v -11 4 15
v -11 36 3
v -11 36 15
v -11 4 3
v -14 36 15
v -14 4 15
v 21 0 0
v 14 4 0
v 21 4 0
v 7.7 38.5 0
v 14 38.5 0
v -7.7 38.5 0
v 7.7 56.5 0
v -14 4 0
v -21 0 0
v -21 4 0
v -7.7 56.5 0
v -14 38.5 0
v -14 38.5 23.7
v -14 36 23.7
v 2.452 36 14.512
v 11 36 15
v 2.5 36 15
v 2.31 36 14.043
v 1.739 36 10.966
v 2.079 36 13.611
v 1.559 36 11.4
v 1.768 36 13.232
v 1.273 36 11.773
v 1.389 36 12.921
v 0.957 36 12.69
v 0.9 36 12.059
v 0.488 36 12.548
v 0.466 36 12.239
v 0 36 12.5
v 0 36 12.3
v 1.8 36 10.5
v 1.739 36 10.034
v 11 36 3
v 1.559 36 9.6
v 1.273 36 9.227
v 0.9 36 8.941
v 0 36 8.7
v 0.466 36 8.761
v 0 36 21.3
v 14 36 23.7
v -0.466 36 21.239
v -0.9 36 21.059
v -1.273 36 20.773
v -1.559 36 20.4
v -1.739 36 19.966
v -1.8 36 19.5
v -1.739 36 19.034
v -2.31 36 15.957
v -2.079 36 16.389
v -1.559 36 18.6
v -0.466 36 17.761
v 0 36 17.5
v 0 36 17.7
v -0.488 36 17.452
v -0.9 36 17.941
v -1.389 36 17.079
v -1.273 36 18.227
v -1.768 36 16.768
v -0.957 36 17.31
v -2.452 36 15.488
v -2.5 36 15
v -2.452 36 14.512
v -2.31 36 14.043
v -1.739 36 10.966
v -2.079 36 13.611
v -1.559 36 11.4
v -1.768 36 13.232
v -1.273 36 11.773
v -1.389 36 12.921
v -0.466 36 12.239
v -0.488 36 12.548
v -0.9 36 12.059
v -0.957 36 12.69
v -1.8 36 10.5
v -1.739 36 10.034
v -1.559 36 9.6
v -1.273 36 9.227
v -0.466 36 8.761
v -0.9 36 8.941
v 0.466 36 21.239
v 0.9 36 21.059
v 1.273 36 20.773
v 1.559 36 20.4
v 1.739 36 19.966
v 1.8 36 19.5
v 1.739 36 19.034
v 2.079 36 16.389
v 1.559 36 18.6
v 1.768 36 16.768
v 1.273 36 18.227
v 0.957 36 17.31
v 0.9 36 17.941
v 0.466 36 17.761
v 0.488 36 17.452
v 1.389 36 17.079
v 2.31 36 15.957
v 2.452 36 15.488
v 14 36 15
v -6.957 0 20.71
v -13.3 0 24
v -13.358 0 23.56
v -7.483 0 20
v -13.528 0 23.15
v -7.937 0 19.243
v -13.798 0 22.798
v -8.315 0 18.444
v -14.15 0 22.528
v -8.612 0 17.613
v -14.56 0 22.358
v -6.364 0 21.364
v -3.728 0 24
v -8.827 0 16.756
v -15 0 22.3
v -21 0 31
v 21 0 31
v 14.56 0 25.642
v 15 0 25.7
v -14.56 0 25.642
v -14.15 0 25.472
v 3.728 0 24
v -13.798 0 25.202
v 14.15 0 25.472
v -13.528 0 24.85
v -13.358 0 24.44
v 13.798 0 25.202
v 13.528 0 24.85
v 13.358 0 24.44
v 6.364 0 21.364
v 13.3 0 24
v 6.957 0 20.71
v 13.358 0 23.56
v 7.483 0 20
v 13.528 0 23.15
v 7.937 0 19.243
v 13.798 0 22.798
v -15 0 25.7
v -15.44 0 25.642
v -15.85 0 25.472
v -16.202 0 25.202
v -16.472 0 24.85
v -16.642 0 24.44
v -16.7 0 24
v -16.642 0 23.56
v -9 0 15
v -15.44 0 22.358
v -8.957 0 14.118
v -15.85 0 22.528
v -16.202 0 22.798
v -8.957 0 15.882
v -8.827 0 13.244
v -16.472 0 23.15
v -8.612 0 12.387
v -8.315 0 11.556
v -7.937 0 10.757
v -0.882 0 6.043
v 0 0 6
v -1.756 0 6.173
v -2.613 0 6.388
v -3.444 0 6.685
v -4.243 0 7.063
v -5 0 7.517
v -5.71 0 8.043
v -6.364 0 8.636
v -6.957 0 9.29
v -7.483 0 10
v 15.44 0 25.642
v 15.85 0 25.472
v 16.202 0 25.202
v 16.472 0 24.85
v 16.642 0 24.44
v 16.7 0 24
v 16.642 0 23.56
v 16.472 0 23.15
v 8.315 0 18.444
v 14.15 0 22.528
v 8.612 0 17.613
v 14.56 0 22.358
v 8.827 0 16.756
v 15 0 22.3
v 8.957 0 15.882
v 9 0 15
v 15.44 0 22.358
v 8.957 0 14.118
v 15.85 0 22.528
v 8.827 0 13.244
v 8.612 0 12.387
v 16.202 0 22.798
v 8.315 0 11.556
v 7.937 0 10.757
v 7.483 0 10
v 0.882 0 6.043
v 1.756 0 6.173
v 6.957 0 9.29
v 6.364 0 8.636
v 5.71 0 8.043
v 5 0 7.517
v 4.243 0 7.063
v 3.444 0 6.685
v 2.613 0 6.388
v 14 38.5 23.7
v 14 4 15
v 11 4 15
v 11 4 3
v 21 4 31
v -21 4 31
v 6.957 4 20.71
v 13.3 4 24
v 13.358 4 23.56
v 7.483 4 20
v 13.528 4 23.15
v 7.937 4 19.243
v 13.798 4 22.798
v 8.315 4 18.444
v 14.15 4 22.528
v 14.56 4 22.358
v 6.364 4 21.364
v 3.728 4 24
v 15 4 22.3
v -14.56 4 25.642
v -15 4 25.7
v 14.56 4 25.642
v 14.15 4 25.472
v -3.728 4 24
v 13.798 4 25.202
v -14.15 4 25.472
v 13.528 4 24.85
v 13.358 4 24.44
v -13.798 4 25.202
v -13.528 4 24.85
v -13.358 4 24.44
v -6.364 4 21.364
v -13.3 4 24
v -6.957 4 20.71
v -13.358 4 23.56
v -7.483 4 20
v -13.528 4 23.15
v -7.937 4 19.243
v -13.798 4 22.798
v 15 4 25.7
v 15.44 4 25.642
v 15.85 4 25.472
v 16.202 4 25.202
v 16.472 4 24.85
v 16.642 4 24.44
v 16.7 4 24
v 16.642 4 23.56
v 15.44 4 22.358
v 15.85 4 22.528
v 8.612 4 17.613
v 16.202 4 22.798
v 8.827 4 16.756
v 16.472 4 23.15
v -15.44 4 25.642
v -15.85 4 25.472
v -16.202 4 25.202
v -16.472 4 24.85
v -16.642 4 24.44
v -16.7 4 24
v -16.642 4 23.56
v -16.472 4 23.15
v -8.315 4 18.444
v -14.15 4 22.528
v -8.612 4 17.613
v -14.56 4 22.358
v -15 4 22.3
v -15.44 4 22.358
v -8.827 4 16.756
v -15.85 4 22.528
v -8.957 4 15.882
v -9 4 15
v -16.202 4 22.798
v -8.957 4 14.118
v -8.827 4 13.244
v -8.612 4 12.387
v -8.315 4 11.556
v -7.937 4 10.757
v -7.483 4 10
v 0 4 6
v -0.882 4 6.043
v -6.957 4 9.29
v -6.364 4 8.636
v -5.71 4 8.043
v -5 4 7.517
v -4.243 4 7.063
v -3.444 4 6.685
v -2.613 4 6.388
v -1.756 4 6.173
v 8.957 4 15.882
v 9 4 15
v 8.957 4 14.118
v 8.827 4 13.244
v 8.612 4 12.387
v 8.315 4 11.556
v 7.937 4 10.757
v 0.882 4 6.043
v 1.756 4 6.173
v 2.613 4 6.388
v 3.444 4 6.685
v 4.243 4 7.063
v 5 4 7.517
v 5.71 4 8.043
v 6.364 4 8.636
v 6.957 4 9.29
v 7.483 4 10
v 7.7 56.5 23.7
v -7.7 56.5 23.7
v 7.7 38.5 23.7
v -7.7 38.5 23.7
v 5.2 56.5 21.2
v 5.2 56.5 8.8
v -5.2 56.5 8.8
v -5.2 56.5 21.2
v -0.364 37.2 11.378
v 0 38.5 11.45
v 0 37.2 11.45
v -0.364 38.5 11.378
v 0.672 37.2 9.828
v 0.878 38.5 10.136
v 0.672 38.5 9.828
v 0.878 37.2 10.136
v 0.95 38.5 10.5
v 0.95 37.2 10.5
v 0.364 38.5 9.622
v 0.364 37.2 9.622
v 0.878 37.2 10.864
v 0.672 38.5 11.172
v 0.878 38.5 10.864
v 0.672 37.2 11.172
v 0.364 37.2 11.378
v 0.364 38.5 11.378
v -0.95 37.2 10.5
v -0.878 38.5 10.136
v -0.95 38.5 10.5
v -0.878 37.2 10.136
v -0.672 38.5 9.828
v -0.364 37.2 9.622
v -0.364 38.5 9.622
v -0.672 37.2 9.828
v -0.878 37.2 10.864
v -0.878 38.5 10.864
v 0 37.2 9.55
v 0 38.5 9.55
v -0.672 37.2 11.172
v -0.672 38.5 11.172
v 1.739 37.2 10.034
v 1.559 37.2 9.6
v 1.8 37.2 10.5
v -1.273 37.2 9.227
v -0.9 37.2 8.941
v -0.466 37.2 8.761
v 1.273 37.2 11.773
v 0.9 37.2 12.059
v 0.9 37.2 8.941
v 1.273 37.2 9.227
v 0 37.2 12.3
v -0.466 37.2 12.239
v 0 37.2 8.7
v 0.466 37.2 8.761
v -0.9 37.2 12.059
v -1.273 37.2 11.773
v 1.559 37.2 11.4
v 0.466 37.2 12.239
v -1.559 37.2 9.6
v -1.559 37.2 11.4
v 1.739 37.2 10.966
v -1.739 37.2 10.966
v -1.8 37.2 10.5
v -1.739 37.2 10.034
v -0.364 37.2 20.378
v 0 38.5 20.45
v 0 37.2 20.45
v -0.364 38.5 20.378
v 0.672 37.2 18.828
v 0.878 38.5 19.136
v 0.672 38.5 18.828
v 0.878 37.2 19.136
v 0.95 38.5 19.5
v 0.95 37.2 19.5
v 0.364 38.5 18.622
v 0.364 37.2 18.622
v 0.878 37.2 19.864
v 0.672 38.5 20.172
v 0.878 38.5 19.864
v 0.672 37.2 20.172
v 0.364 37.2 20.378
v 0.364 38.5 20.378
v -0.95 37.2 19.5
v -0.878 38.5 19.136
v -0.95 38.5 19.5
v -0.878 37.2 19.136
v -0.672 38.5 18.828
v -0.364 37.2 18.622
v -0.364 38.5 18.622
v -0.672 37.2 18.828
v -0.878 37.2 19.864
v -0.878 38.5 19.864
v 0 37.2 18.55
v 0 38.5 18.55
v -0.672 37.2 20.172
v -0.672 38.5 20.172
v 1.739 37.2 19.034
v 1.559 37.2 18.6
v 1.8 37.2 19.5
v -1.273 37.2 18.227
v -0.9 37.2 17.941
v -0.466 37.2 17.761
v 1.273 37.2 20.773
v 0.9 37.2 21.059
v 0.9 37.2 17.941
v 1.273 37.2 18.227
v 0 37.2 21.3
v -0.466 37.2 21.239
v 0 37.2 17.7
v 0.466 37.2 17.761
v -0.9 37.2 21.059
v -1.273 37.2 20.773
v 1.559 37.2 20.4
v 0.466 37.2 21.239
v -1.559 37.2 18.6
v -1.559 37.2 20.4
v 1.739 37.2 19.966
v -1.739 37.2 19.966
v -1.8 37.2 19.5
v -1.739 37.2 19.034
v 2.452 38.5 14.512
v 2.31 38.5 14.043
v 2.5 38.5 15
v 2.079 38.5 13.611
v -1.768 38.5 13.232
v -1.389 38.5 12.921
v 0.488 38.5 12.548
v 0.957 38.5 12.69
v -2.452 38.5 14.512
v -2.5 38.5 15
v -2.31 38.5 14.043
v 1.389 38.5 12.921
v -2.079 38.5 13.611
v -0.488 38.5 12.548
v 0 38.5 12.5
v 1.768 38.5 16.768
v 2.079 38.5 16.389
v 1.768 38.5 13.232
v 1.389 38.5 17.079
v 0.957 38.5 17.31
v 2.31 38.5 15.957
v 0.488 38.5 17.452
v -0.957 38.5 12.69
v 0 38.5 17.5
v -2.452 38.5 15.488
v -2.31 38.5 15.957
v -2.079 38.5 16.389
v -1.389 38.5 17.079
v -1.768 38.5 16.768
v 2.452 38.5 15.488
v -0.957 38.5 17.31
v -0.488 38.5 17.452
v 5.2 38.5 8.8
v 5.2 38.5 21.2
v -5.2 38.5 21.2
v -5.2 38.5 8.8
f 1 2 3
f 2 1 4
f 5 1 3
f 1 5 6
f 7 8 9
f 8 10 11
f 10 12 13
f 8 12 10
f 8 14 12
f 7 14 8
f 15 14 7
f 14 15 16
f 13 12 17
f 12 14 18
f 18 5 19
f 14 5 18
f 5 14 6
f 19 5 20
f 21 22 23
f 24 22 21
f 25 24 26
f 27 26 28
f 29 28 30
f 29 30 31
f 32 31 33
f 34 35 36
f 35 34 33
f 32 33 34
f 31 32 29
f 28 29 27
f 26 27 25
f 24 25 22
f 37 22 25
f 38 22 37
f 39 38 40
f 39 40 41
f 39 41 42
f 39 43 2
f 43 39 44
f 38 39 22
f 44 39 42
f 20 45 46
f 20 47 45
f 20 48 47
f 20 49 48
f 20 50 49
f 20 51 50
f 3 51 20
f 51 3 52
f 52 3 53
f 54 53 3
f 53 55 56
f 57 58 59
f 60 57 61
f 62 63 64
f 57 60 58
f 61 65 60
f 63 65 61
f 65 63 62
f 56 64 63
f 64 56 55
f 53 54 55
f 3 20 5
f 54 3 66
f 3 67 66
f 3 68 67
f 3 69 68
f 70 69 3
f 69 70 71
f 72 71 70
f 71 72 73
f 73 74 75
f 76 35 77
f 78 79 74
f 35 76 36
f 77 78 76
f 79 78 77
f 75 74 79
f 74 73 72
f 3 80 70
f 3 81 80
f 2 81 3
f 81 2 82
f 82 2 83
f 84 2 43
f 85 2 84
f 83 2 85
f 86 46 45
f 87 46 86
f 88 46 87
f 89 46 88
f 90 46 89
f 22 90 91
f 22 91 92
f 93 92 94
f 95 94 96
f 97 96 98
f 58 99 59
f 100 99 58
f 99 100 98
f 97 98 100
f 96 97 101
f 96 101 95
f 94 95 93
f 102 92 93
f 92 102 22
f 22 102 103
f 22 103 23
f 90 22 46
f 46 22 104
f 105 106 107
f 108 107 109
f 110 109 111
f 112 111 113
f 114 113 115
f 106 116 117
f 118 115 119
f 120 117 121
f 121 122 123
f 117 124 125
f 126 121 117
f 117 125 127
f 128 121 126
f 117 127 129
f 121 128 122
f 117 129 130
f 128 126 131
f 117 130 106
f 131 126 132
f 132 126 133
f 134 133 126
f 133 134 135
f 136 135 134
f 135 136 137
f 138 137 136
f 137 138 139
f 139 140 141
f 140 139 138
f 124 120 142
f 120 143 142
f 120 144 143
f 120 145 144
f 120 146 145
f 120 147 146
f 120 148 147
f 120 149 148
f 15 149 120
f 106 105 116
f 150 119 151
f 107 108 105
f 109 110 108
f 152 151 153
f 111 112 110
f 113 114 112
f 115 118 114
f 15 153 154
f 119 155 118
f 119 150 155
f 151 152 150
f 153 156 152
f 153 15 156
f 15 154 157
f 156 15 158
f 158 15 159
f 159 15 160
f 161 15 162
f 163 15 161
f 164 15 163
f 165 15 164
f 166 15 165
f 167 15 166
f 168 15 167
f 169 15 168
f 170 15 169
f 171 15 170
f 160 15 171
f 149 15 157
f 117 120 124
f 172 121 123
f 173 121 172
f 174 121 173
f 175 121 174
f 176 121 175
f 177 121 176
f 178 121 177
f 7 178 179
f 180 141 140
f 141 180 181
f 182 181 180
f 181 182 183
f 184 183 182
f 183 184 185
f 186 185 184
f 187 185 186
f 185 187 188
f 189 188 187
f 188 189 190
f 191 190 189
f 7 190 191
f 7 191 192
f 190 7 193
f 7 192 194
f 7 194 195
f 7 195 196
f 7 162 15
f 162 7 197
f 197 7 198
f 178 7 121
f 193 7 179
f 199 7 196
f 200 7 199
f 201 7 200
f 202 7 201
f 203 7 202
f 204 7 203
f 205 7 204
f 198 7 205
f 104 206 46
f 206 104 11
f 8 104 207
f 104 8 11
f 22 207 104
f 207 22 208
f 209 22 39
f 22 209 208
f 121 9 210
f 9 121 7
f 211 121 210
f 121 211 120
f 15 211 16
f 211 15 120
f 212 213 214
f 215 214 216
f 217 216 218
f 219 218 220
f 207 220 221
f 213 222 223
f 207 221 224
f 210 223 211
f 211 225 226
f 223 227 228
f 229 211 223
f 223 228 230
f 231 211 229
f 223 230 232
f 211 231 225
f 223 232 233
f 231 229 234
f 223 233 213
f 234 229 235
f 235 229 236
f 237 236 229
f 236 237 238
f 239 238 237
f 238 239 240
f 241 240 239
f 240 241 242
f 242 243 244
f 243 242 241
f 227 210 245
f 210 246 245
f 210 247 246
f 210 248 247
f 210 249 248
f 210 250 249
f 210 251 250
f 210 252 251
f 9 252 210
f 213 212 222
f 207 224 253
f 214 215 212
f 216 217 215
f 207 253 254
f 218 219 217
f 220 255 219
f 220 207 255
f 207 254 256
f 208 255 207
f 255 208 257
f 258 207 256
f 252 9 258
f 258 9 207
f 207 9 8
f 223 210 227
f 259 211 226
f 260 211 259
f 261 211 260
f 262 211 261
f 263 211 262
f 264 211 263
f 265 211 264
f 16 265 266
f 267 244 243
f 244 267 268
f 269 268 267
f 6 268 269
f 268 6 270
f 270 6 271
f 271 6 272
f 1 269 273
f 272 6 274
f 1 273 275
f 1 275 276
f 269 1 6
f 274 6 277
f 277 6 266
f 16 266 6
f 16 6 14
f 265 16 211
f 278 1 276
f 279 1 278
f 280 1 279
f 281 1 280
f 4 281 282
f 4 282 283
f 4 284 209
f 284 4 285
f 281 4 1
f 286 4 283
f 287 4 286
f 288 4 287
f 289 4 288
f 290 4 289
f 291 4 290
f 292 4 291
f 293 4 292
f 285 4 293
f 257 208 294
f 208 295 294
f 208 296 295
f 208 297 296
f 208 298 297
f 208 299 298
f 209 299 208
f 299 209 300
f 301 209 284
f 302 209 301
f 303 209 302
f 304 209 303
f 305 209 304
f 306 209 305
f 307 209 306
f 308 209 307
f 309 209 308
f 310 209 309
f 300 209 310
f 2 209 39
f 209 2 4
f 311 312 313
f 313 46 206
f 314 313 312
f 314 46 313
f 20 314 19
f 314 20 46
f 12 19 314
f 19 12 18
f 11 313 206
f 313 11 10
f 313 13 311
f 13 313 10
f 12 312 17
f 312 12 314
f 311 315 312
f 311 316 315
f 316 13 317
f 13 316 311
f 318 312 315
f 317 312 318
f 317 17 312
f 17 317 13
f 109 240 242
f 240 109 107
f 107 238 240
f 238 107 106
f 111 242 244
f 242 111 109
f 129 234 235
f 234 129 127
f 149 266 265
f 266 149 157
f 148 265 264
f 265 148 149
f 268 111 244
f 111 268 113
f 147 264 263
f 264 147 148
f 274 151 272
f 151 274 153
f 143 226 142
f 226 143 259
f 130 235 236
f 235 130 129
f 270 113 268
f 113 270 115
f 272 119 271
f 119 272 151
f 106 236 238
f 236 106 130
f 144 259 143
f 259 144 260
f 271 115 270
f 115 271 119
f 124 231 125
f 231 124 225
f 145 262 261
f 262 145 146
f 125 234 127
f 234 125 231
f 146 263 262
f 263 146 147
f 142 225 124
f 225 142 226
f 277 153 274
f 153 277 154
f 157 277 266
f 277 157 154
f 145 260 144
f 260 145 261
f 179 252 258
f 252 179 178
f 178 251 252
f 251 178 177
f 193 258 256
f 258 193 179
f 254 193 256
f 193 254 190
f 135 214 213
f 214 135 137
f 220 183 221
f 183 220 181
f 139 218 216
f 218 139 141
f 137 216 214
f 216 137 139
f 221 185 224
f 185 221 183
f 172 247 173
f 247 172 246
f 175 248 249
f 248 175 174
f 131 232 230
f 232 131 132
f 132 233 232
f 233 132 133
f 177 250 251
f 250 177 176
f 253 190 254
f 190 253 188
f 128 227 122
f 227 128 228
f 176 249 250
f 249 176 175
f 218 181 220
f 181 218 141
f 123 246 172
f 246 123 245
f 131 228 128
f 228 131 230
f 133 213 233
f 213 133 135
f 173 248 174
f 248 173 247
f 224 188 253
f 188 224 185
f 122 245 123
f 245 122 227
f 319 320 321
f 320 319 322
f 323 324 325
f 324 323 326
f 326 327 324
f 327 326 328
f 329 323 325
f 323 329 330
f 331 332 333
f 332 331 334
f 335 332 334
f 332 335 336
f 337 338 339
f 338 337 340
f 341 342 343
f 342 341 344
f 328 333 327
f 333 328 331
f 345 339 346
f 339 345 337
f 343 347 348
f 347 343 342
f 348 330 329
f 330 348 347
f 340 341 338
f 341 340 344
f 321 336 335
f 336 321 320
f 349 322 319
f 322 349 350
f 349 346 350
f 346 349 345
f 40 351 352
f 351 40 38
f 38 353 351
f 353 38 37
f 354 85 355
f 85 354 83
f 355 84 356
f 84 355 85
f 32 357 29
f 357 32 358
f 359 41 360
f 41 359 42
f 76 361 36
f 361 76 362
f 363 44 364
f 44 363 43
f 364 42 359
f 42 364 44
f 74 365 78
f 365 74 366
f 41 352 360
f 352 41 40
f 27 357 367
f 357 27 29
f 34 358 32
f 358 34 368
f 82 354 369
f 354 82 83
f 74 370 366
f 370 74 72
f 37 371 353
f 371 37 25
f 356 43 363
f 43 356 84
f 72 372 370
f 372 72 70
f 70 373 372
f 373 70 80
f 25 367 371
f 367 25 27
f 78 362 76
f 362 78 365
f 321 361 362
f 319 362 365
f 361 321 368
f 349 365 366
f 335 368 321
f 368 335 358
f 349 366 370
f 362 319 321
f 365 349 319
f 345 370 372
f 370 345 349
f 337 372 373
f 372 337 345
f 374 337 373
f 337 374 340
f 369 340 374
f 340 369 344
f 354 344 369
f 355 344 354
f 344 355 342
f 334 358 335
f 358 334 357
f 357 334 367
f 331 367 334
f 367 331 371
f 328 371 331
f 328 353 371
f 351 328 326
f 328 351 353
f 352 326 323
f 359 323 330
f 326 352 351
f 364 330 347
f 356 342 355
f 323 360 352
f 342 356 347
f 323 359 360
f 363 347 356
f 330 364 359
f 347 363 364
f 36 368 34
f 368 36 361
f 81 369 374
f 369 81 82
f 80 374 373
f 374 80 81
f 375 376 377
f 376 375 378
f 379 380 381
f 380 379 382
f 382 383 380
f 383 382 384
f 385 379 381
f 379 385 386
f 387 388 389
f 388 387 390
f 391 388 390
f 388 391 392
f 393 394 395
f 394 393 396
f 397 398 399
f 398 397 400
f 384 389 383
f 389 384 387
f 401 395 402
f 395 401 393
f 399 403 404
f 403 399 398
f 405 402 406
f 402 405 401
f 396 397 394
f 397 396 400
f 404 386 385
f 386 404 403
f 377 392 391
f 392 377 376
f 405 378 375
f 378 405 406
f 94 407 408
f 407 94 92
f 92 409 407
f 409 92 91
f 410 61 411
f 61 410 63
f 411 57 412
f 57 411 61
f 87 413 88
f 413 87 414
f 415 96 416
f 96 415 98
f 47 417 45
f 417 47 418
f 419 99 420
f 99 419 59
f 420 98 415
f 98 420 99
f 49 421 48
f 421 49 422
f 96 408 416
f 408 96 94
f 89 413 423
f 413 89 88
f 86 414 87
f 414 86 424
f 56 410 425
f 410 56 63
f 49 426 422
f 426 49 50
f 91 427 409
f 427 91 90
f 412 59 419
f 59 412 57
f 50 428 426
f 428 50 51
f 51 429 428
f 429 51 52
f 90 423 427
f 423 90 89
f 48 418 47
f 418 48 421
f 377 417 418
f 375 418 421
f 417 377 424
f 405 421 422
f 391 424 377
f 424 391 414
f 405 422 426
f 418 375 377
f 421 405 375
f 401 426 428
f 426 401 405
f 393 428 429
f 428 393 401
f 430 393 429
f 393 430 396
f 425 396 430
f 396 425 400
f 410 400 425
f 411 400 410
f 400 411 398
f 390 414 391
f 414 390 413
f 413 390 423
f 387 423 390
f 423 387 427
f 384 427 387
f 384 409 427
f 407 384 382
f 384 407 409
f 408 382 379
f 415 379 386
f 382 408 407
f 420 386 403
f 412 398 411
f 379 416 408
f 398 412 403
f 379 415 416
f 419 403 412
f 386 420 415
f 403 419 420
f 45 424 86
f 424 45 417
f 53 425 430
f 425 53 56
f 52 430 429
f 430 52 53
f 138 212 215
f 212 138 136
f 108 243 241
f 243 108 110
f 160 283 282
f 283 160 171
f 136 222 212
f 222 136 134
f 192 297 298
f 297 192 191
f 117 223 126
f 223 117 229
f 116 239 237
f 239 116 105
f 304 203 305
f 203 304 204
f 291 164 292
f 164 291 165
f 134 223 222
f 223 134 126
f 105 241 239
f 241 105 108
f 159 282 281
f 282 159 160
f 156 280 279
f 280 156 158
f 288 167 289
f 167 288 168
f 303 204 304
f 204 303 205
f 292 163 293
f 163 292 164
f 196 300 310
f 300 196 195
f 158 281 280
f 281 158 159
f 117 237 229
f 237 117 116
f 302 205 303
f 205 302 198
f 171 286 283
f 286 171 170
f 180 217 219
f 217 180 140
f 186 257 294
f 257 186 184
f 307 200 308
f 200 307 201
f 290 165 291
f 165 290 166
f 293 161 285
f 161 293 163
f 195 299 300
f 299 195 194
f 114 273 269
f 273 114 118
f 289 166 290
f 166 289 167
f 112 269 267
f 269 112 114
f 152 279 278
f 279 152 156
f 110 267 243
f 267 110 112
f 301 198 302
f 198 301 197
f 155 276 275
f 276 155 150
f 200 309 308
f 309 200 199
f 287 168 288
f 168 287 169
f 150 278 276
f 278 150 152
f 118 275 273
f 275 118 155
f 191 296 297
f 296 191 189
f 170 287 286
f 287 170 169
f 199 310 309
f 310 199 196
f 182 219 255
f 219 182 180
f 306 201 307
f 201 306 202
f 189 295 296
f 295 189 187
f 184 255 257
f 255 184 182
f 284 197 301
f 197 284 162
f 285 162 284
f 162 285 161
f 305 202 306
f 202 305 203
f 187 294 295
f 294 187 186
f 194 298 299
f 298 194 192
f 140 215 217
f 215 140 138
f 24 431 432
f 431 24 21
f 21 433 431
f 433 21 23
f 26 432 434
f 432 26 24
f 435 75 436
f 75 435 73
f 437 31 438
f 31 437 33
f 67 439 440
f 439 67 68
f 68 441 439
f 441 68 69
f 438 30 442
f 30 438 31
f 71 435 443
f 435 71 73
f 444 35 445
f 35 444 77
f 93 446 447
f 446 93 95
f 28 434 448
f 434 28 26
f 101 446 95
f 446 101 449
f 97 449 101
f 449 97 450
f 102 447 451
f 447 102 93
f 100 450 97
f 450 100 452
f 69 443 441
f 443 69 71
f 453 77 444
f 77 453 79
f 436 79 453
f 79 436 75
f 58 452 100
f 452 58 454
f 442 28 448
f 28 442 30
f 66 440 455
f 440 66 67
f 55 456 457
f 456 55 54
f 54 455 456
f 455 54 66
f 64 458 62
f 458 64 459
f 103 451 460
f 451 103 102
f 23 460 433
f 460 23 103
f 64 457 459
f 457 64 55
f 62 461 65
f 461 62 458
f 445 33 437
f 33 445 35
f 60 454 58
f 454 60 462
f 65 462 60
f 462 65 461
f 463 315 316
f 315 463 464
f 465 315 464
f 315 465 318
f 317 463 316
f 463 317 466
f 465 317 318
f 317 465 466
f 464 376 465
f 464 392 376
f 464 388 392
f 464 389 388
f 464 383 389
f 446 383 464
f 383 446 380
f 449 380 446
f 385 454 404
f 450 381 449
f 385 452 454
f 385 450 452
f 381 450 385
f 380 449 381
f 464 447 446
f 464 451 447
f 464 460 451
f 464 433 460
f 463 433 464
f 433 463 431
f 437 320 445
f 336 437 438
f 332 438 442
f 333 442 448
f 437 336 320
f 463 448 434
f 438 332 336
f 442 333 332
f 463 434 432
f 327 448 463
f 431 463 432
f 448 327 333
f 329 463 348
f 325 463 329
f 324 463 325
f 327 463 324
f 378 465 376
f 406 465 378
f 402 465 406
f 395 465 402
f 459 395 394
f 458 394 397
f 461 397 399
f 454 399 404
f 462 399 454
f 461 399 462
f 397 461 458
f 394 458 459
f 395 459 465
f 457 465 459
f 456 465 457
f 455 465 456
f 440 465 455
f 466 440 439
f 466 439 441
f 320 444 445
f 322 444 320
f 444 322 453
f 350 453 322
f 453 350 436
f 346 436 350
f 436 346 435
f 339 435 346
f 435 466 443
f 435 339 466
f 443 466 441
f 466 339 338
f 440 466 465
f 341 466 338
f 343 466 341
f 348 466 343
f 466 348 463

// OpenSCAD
// file: conveyor_roller.scad
// =============================================
// Riftbound Card Sorter — Conveyor Roller / Round-Belt Pulley
// =============================================
// Print 2× (one per 8mm rod: near x=-140 + far x=+60, both driven).
// Drive: N20 → 3mm-to-8mm set-screw coupling (motor_mount.scad) → 8mm rod
//        → this roller (D-bore keyed to the rod flat + M3 grub screw).
// The rollers are the pulleys of a 4-strand ROUND-BELT conveyor: four
// 135 × 3mm NBR O-rings run in the grooves and carry the card across the
// 200mm span between the rollers (slide_bed.scad sits under the top span).
// Material: PLA/PETG, 4 perimeters, 60% infill
//
// Local frame: roller axis = +Z, z = 0 at the front (-Y, motor-side) end.
// In assembly.scad: translate([x, -roller_w/2, 19]) rotate([-90,0,0]),
// so machine Y = z - 44.
// =============================================
//
// ── ROUND BELT (O-ring) MATH ────────────────────────────────────────────
//   Belt: NBR 70A O-ring, ID 135 × CS 3.0 (OD 141), 4 per machine.
//   Free centreline length  = π·(ID + CS) = π·138       = 433.5 mm
//   Stretched CS ≈ 3/√1.074 = 2.89 → cord centre rests at r = 10.45
//   Pitch dia Dp            = 2·10.45                    = 20.9 mm
//   Belt path (open, equal pulleys, C = 200) = 2C + π·Dp = 465.6 mm
//   Stretch                 = 465.6 / 433.5 − 1          = 7.4 %
//   Static tension ≈ E·ε·A ≈ 6 MPa·0.074·6.6 mm² ≈ 2.9 N per strand
//   Sag at mid-span: self weight (8.5 g/m) 0.14 mm + 1.8 g card 0.08 mm
//   → < 0.25 mm, irrelevant optically; slide bed added for robustness.
//   Belt top (card face) r = 10.45 + 1.45 = 11.9 → 0.9 mm above the
//   roller body, so the card only ever touches the belts.
// ────────────────────────────────────────────────────────────────────────

roller_dia  = 22;
roller_w    = 88;    // 90mm rail gap − 2 × 1.0mm running clearance
shaft_bore  = 8.2;   // clearance for 8mm steel rod (ream with 8mm bit)

// Round-belt grooves: R1.6 round bottom + 45° flanks to the OD (teardrop on
// both sides). The old U-groove (R1.6 + flanks parallel to the OD) put a flat
// ceiling over the cord when printed axis-vertical: the region flatter than
// 45° spanned r 9.47 → 11.0 = 1.53 mm, the last layer stepping out ≈ 1.2 mm in
// one go, right where the cord has only 0.15 mm side clearance — droop would
// pinch the belt. With 45° flanks nothing overhangs past 45°. The tensioned
// cord (r 1.45) seats in the R1.6 bottom, which centres it; at its equator
// (r 10.45) the groove is ±2.11, i.e. ≤ 0.66 mm free side play, and the
// mouth at the OD is 5.3 wide (lands 11.7 between strands).
belt_cs      = 3.0;                 // O-ring cross-section (free)
belt_y       = [-25.5, -8.5, 8.5, 25.5];   // strand centres, machine Y (17mm pitch)
groove_r     = 1.6;                 // bottom radius (free cord r 1.5 + 0.1)
groove_c     = 10.6;                // groove-circle centre radius → bottom at r 9.0
belt_pitch_r = 10.45;               // stretched cord centre radius (see math)
belt_top_r   = 11.9;                // card face radius

rod_dia      = 8;
motor_flat_w = 4;    // width of the flat ground along the 8mm rod
flat_clr     = 0.15; // radial clearance roller flat → rod flat
// distance from axis to the roller's flat face (3.61mm for a 4mm-wide flat)
flat_off     = sqrt(pow(rod_dia / 2, 2) - pow(motor_flat_w / 2, 2)) + flat_clr;

// Axial location: M3 heat-set insert (radial, mid-roller, on the flat side)
// + M3 × 6 cup-point grub screw onto the rod flat. Keeps the roller centred
// with 1.0mm to each rail inner face. (Rod itself is located by the two
// collars outside the bearings — see motor_mount.scad.)
grub_z       = roller_w / 2;   // between the two inner belts (±8.5)
grub_insert_d = 4.0;
grub_insert_l = 6.0;           // from the surface inward (insert 5.7 long)
grub_d       = 3.2;            // through to the flat

// 608 inner-race spacer: sits between each bearing's inner ring and the
// rod collar so the collar can never touch the (stationary) ZZ shield.
spacer_id    = 8.3;
spacer_od    = 11.0;           // < 608 inner-ring land Ø12.1
spacer_t     = 1.0;

function roller_width()        = roller_w;
function roller_belt_y()       = belt_y;
function roller_belt_pitch_r() = belt_pitch_r;
function roller_belt_top_r()   = belt_top_r;
function roller_belt_cs()      = 2 * (belt_top_r - belt_pitch_r);  // stretched CS 2.9
function race_spacer_t()       = spacer_t;

// D-shaped bore: round bore minus the key (material left on the flat side)
module d_bore(h)
    difference() {
        cylinder(d = shaft_bore, h = h, $fn = 48);
        translate([-shaft_bore, flat_off, -1])
            cube([2 * shaft_bore, shaft_bore, h + 2]);
    }

// Groove profile in the (r, z) half-plane: R1.6 circle + 45° tangent flanks
module groove_2d() {
    t  = groove_r / sqrt(2);                 // 45° tangent point offset (1.13)
    r0 = groove_c - t;                       // 9.47
    r1 = roller_dia / 2 + 1;                 // past the OD
    translate([groove_c, 0]) circle(r = groove_r, $fn = 32);
    polygon([[r0, -t], [r1, -t - (r1 - r0)], [r1, t + (r1 - r0)], [r0, t]]);
}

module roller() {
    difference() {
        cylinder(d = roller_dia, h = roller_w, $fn = 96);

        // D-bore keyed to the rod flat (flat face at +y = flat_off)
        translate([0, 0, -0.1]) d_bore(roller_w + 0.2);

        // Round-belt grooves (U profile: R1.6 circle + straight walls)
        for (y = belt_y)
            translate([0, 0, y + roller_w / 2])
                rotate_extrude($fn = 96) groove_2d();

        // Grub-screw insert hole (radial, through the flat side) + screw hole
        translate([0, roller_dia / 2 + 0.1, grub_z]) rotate([90, 0, 0]) {
            cylinder(d = grub_insert_d, h = grub_insert_l + 0.1, $fn = 24);
            cylinder(d = grub_d, h = roller_dia / 2, $fn = 24);
        }
    }
}

module race_spacer()
    difference() {
        cylinder(d = spacer_od, h = spacer_t, $fn = 48);
        translate([0, 0, -0.1]) cylinder(d = spacer_id, h = spacer_t + 0.2, $fn = 32);
    }

// Reference solid: one stretched O-ring strand (round cord) running over
// two pulleys c apart, in the XZ plane (x along travel, z up, y = 0 on the
// strand), pulley axes along Y at x = 0 and x = c.
module belt_strand(c = 200) {
    cr = roller_belt_cs() / 2;
    // full torus in each groove (the inner half coincides with the groove,
    // so it adds no false contact; bed ends are 13mm from the axes)
    for (x = [0, c])
        translate([x, 0, 0]) rotate([90, 0, 0])
            rotate_extrude($fn = 64)
                translate([belt_pitch_r, 0]) circle(r = cr, $fn = 24);
    for (z = [-belt_pitch_r, belt_pitch_r])
        translate([0, 0, z]) rotate([0, 90, 0])
            cylinder(r = cr, h = c, $fn = 24);
}

roller();
// translate([20, 0, 0]) race_spacer();   // print 4

// =============================================
// PRINT ORIENTATION: axis vertical (on end); spacer flat
// SUPPORTS: none (groove flanks are 45°, see the groove note; Ø4 radial hole bridges)
// POST-PROCESS: ream bore with an 8mm drill bit (keep the flat),
//   heat-set one M3 insert into the radial hole, flush with the surface.
// ROD: full-length flat, ~0.5mm deep / 4mm wide (or buy 8mm D-shaft) —
//   keys this roller and seats the coupling set screw.
// ASSEMBLY: slide roller on, centre it (1.0mm gap to each rail face),
//   tighten the M3 × 6 grub onto the flat. Fit 4 O-rings across both
//   rollers before the second rod goes in (or roll them on over the end).
// =============================================
// main file
// =============================================
// Riftbound Card Sorter — N20 Motor Standoff Bracket
// =============================================
// Holds one N20 gear motor coaxial with an 8mm roller rod, on the OUTER
// side of the front (-Y) conveyor rail, joined by a 3mm→8mm shaft coupling.
// Print 2× — one per driven roller (both rollers are driven: L9110S ch A
// and ch B, hardware/conveyor.py).
//
// Drive train, outward from the rail (axis = Y below, 0 = boss face):
//   rail inner face │ 3mm wall/shoulder │ 608ZZ in Ø22.15×7 pocket │ y=0 boss face
//   │ FLANGE 0..4 (Ø18 hole) — race spacer 0..1, 8mm collar 1..9 inside it
//   │ gap │ COUPLING 10..35 (Ø19×25) │ gap │ FACE PLATE │ N20 → motor body
//
//   - The flange seats on the boss face + both insert pads and covers the
//     608 OUTER ring (Ø18..22 annulus; bearing is flush with the boss face),
//     so it retains the bearing outward. Its Ø18 hole clears the inner ring
//     (land Ø12.1, 2.95mm radial), the rod, the Ø11 race spacer and the
//     Ø16 shaft collar (1.0mm radial) — it never touches anything rotating.
//   - Race spacer (conveyor_roller.scad, 8.3/11 × 1) + 8mm collar ride on
//     the rod against the inner ring: with the matching collar on the back
//     rail they locate the rod axially. Tighten the collar BEFORE fitting
//     the bracket (its set screw is behind the flange afterwards).
//   - 8mm rod sticks out rod_protrusion (20) past the boss face and enters
//     the coupling's 8mm bore by cpl_rod_engage (10mm).
//   - N20 3mm D-shaft (10mm long) passes the face plate and enters the
//     coupling's 3mm bore by n20_engage (6.5mm, covers the set screw).
//   - The coupling bay is an open-top U-channel (side walls only up to the
//     shaft centreline) so both coupling set screws can be reached from above.
//
// Coupling: aluminium 3mm×8mm bore, D19 × L25, 2× M3 set screws
//   (e.g. https://kitsguru.com/products/19mm-outer-diameter-x-25mm-length-3mm-x-8mm-inner-diameter-rb-aluminium-flexible-shaft-coupling
//    — same D19L25 3×8 helical coupling is sold widely on Amazon/AliExpress).
// Collar: 8mm bore × Ø16 × 8 wide, M4 set screw (e.g. Climax GMC-08, RS PRO
//   122-3450, Stafford 34LM008). A Ø18 collar fits too (0mm margin — avoid).
//
// Frame (assembled): X = along rail (shaft at X=0), Y = 0 on the bearing
// boss face, +Y away from the rail, Z = 0 on the rail base / baseplate.
// Place onto a rail_half(): translate([shaft_x, rail_boss_face_y(), 0]).
//
// Material: PETG or PLA, 0.2mm, 4 walls, 40% infill
// =============================================

use <conveyor_rail.scad>
use <conveyor_roller.scad>

// --- From the rail / roller (single source of truth) ---
shaft_y      = rail_shaft_y();            // 15 — rod axis height
boss_d       = rail_boss_d();             // 29
pocket_d     = rail_pocket_d();           // 22.15
screw_offs   = rail_mm_screw_offsets();   // [[±15, +9]] rel. to shaft (17.5mm)
spacer_t     = race_spacer_t();           // 1.0

// --- 608ZZ ---
brg_inner_land_d = 12.1;   // inner-ring OD land (rotating)
brg_od           = 22.0;

// --- N20 micro gear motor ---
motor_w      = 10.0;   // body width  (X)
motor_h      = 12.0;   // body height (Z)
motor_l      = 20.0;   // gearbox + can length (Y)
n20_shaft_l  = 10.0;   // 3mm D-shaft length from gearbox face
n20_bush_d   =  5.0;   // clearance for the gearbox-face bushing
n20_hole_spc =  9.0;   // 2× M1.6 tapped holes in gearbox face, along the 12mm side (Z)
n20_hole_d   =  1.9;   // M1.6 clearance
n20_head_d   =  3.6;   // M1.6 pan head counterbore
n20_head_h   =  1.2;   // counterbore depth (keeps heads clear of the coupling)
motor_clr    =  0.2;   // pocket clearance per side (snug slide fit)

// --- Rod collar (8mm bore) ---
collar_od     = 16.0;
collar_w      =  8.0;

// --- Shaft coupling (3mm ↔ 8mm) ---
cpl_od        = 19.0;
cpl_len       = 25.0;
cpl_clr       =  1.5;  // radial clearance to bay walls / floor
cpl_rod_engage = 10.0; // 8mm rod depth into coupling (≤ half length)

// --- Bracket ---
flange_t     =  4.0;   // back flange, seats on boss face + insert pads
flange_hw    = 21.0;   // flange half-width (X)
flange_top   = 31.0;   // flange top Z: covers the Ø29 boss (top 29.5); rail top 35
flange_hole_d = 18.0;  // centre hole: collar Ø16 + 1mm, < 608 OD so the
                       //   flange still bears on the outer ring
gap_collar_cpl = 1.0;  // collar → coupling end
gap_cpl_face   = 1.0;  // coupling end → face plate
face_t       =  2.5;   // face plate the gearbox screws to
wall_t       =  3.0;   // bay side walls
floor_t      =  3.0;
sleeve_wall  =  2.5;
sleeve_len   = 18.0;   // covers 18 of the 20mm body; rear + tabs exposed
m3_clear_d   =  3.4;

// ---- Derived ---------------------------------------------------
collar_y0  = spacer_t;                            //  1.0
collar_y1  = collar_y0 + collar_w;                //  9.0
cpl_y0     = collar_y1 + gap_collar_cpl;          // 10.0 coupling start
cpl_y1     = cpl_y0 + cpl_len;                    // 35.0 coupling end
face_y0    = cpl_y1 + gap_cpl_face;               // 36.0
motor_y0   = face_y0 + face_t;                    // 38.5 gearbox face
sleeve_y1  = motor_y0 + sleeve_len;               // 56.5
motor_y1   = motor_y0 + motor_l;                  // 58.5 motor rear

bay_hw     = cpl_od / 2 + cpl_clr;                // 11.0 bay inner half-width
pocket_w   = motor_w + 2 * motor_clr;             // 10.4
pocket_h   = motor_h + 2 * motor_clr;             // 12.4
sleeve_hw  = pocket_w / 2 + sleeve_wall;          //  7.7
sleeve_top = shaft_y + pocket_h / 2 + sleeve_wall; // 23.7

rod_protrusion = cpl_y0 + cpl_rod_engage;         // 20.0 past boss face
n20_engage     = n20_shaft_l - face_t - gap_cpl_face; // 6.5 into coupling

function mm_rod_protrusion() = rod_protrusion;
function mm_collar_od()      = collar_od;
function mm_collar_w()       = collar_w;

echo(str("MOTOR MOUNT: rod protrusion past boss face = ", rod_protrusion,
         " mm; N20 shaft engagement = ", n20_engage,
         " mm; rod-end to N20-shaft-tip gap = ",
         (motor_y0 - n20_shaft_l) - rod_protrusion, " mm; overall depth = ",
         motor_y1, " mm; flange hole Ø", flange_hole_d,
         " (inner-ring radial clr ", (flange_hole_d - brg_inner_land_d) / 2,
         ", collar radial clr ", (flange_hole_d - collar_od) / 2, ")"));

assert(cpl_rod_engage <= cpl_len / 2, "rod would run past coupling centre");
assert(rod_protrusion < motor_y0 - n20_shaft_l, "rod end hits N20 shaft tip");
assert(n20_engage >= 5, "N20 shaft barely reaches the coupling set screw");
assert(shaft_y - cpl_od / 2 - cpl_clr >= floor_t, "coupling rubs the floor");
assert(flange_hole_d > collar_od + 1, "collar rubs the flange");
assert(flange_hole_d > brg_inner_land_d + 2, "flange too close to the 608 inner ring");
assert(flange_hole_d < brg_od - 2, "flange no longer covers the 608 outer ring");
assert(collar_od / 2 < bay_hw, "collar rubs the bay walls");
assert(flange_top >= shaft_y + boss_d / 2, "flange does not cover the boss");
for (o = screw_offs)
    assert(norm(o) >= 15, "mount screw inside 15mm of shaft centre");

// Flat-topped teardrop: prints the Ø18 horizontal hole without supports
module teardrop_y(d, h)
    rotate([-90, 0, 0]) linear_extrude(h)
        intersection() {
            union() {
                circle(d = d, $fn = 64);
                rotate(-135) square(d / 2);   // point → 2D -y → machine +Z
            }
            translate([-d, -d / 2]) square([2 * d, d]);   // flat cap at Z = +r
        }

module motor_mount() {
    difference() {
        union() {
            // Back flange — seats on boss face + both insert pads
            translate([-flange_hw, 0, 0])
                cube([2 * flange_hw, flange_t, flange_top]);

            // Coupling bay: floor + two side walls up to the shaft centreline
            // (open top = set-screw access window)
            translate([-bay_hw - wall_t, 0, 0])
                cube([2 * (bay_hw + wall_t), face_y0, floor_t]);
            for (s = [-1, 1])
                translate([s > 0 ? bay_hw : -bay_hw - wall_t, 0, 0])
                    cube([wall_t, face_y0, shaft_y]);

            // Face plate — N20 gearbox face screws to its back side
            translate([-bay_hw - wall_t, face_y0, 0])
                cube([2 * (bay_hw + wall_t), face_t, sleeve_top]);

            // Motor sleeve (solid down to the floor for a flat print base)
            translate([-sleeve_hw, motor_y0 - 0.01, 0])
                cube([2 * sleeve_hw, sleeve_len + 0.01, sleeve_top]);
        }

        // Flange centre hole (rod, 608 inner ring, spacer, collar, driver access)
        translate([0, -0.1, shaft_y]) teardrop_y(flange_hole_d, flange_t + 0.2);

        // M3 clearance holes → heat-set inserts in the rail pads
        for (o = screw_offs)
            translate([o[0], -0.1, shaft_y + o[1]])
                rotate([-90, 0, 0])
                cylinder(d = m3_clear_d, h = flange_t + 0.2, $fn = 24);

        // Face plate: gearbox bushing + 2× M1.6 screws with counterbores
        translate([0, face_y0 - 0.1, shaft_y])
            rotate([-90, 0, 0])
            cylinder(d = n20_bush_d, h = face_t + 0.2, $fn = 32);
        for (dz = [-n20_hole_spc / 2, n20_hole_spc / 2]) {
            translate([0, face_y0 - 0.1, shaft_y + dz])
                rotate([-90, 0, 0])
                cylinder(d = n20_hole_d, h = face_t + 0.2, $fn = 16);
            translate([0, face_y0 - 0.1, shaft_y + dz])
                rotate([-90, 0, 0])
                cylinder(d = n20_head_d, h = n20_head_h + 0.1, $fn = 24);
        }

        // Motor pocket — open at the rear for the motor tabs / wires
        translate([-pocket_w / 2, motor_y0, shaft_y - pocket_h / 2])
            cube([pocket_w, sleeve_len + 0.1, pocket_h]);
    }
}

// Reference solids (for assembly / collision checks, not printed)
module motor_mount_coupling()
    translate([0, cpl_y0, shaft_y]) rotate([-90, 0, 0])
        cylinder(d = cpl_od, h = cpl_len, $fn = 48);
module motor_mount_collar()     // collar + race spacer, outside the bearing
    translate([0, 0, shaft_y]) rotate([-90, 0, 0]) {
        race_spacer();
        translate([0, 0, collar_y0]) difference() {
            cylinder(d = collar_od, h = collar_w, $fn = 48);
            translate([0, 0, -0.1]) cylinder(d = 8, h = collar_w + 0.2, $fn = 32);
        }
    }
module motor_mount_n20()
    union() {
        translate([-motor_w / 2, motor_y0, shaft_y - motor_h / 2])
            cube([motor_w, motor_l, motor_h]);
        translate([0, motor_y0 - n20_shaft_l, shaft_y]) rotate([-90, 0, 0])
            cylinder(d = 3, h = n20_shaft_l, $fn = 16);
    }
module motor_mount_rod_stub()   // rod portion past the boss face
    translate([0, -0.01, shaft_y]) rotate([-90, 0, 0])
        cylinder(d = 8, h = rod_protrusion + 0.01, $fn = 32);

motor_mount();

// =============================================
// PRINT ORIENTATION: floor (Z=0) on the bed, as modelled
// SUPPORTS: none (flange hole is a flat-topped teardrop, 7.5mm bridge;
//           motor pocket roof is a short bridge)
// FASTENERS: 2× M3×10 BHCS → M3 heat-set inserts in the rail pads
//            2× M1.6×4 pan head → N20 gearbox-face tapped holes
// ASSEMBLY ORDER:
//   1. Slide N20 into the sleeve from the rear, screw its face to the
//      face plate (driver through the flange hole).
//   2. Push the coupling's 3mm bore onto the N20 shaft (set screw on the
//      D-flat), leave it loose.
//   3. Rod (150mm) through both bearings + roller, 20mm past the front boss
//      face. On each side slide on a race spacer + 8mm collar, push both
//      collars against the bearings (no end play) and tighten them.
//   4. Offer the bracket up (flange hole passes over the collar), slide the
//      coupling onto the rod, 2× M3×10 into the inserts, then tighten the
//      coupling's 8mm set screw from above onto the rod flat.
// =============================================
